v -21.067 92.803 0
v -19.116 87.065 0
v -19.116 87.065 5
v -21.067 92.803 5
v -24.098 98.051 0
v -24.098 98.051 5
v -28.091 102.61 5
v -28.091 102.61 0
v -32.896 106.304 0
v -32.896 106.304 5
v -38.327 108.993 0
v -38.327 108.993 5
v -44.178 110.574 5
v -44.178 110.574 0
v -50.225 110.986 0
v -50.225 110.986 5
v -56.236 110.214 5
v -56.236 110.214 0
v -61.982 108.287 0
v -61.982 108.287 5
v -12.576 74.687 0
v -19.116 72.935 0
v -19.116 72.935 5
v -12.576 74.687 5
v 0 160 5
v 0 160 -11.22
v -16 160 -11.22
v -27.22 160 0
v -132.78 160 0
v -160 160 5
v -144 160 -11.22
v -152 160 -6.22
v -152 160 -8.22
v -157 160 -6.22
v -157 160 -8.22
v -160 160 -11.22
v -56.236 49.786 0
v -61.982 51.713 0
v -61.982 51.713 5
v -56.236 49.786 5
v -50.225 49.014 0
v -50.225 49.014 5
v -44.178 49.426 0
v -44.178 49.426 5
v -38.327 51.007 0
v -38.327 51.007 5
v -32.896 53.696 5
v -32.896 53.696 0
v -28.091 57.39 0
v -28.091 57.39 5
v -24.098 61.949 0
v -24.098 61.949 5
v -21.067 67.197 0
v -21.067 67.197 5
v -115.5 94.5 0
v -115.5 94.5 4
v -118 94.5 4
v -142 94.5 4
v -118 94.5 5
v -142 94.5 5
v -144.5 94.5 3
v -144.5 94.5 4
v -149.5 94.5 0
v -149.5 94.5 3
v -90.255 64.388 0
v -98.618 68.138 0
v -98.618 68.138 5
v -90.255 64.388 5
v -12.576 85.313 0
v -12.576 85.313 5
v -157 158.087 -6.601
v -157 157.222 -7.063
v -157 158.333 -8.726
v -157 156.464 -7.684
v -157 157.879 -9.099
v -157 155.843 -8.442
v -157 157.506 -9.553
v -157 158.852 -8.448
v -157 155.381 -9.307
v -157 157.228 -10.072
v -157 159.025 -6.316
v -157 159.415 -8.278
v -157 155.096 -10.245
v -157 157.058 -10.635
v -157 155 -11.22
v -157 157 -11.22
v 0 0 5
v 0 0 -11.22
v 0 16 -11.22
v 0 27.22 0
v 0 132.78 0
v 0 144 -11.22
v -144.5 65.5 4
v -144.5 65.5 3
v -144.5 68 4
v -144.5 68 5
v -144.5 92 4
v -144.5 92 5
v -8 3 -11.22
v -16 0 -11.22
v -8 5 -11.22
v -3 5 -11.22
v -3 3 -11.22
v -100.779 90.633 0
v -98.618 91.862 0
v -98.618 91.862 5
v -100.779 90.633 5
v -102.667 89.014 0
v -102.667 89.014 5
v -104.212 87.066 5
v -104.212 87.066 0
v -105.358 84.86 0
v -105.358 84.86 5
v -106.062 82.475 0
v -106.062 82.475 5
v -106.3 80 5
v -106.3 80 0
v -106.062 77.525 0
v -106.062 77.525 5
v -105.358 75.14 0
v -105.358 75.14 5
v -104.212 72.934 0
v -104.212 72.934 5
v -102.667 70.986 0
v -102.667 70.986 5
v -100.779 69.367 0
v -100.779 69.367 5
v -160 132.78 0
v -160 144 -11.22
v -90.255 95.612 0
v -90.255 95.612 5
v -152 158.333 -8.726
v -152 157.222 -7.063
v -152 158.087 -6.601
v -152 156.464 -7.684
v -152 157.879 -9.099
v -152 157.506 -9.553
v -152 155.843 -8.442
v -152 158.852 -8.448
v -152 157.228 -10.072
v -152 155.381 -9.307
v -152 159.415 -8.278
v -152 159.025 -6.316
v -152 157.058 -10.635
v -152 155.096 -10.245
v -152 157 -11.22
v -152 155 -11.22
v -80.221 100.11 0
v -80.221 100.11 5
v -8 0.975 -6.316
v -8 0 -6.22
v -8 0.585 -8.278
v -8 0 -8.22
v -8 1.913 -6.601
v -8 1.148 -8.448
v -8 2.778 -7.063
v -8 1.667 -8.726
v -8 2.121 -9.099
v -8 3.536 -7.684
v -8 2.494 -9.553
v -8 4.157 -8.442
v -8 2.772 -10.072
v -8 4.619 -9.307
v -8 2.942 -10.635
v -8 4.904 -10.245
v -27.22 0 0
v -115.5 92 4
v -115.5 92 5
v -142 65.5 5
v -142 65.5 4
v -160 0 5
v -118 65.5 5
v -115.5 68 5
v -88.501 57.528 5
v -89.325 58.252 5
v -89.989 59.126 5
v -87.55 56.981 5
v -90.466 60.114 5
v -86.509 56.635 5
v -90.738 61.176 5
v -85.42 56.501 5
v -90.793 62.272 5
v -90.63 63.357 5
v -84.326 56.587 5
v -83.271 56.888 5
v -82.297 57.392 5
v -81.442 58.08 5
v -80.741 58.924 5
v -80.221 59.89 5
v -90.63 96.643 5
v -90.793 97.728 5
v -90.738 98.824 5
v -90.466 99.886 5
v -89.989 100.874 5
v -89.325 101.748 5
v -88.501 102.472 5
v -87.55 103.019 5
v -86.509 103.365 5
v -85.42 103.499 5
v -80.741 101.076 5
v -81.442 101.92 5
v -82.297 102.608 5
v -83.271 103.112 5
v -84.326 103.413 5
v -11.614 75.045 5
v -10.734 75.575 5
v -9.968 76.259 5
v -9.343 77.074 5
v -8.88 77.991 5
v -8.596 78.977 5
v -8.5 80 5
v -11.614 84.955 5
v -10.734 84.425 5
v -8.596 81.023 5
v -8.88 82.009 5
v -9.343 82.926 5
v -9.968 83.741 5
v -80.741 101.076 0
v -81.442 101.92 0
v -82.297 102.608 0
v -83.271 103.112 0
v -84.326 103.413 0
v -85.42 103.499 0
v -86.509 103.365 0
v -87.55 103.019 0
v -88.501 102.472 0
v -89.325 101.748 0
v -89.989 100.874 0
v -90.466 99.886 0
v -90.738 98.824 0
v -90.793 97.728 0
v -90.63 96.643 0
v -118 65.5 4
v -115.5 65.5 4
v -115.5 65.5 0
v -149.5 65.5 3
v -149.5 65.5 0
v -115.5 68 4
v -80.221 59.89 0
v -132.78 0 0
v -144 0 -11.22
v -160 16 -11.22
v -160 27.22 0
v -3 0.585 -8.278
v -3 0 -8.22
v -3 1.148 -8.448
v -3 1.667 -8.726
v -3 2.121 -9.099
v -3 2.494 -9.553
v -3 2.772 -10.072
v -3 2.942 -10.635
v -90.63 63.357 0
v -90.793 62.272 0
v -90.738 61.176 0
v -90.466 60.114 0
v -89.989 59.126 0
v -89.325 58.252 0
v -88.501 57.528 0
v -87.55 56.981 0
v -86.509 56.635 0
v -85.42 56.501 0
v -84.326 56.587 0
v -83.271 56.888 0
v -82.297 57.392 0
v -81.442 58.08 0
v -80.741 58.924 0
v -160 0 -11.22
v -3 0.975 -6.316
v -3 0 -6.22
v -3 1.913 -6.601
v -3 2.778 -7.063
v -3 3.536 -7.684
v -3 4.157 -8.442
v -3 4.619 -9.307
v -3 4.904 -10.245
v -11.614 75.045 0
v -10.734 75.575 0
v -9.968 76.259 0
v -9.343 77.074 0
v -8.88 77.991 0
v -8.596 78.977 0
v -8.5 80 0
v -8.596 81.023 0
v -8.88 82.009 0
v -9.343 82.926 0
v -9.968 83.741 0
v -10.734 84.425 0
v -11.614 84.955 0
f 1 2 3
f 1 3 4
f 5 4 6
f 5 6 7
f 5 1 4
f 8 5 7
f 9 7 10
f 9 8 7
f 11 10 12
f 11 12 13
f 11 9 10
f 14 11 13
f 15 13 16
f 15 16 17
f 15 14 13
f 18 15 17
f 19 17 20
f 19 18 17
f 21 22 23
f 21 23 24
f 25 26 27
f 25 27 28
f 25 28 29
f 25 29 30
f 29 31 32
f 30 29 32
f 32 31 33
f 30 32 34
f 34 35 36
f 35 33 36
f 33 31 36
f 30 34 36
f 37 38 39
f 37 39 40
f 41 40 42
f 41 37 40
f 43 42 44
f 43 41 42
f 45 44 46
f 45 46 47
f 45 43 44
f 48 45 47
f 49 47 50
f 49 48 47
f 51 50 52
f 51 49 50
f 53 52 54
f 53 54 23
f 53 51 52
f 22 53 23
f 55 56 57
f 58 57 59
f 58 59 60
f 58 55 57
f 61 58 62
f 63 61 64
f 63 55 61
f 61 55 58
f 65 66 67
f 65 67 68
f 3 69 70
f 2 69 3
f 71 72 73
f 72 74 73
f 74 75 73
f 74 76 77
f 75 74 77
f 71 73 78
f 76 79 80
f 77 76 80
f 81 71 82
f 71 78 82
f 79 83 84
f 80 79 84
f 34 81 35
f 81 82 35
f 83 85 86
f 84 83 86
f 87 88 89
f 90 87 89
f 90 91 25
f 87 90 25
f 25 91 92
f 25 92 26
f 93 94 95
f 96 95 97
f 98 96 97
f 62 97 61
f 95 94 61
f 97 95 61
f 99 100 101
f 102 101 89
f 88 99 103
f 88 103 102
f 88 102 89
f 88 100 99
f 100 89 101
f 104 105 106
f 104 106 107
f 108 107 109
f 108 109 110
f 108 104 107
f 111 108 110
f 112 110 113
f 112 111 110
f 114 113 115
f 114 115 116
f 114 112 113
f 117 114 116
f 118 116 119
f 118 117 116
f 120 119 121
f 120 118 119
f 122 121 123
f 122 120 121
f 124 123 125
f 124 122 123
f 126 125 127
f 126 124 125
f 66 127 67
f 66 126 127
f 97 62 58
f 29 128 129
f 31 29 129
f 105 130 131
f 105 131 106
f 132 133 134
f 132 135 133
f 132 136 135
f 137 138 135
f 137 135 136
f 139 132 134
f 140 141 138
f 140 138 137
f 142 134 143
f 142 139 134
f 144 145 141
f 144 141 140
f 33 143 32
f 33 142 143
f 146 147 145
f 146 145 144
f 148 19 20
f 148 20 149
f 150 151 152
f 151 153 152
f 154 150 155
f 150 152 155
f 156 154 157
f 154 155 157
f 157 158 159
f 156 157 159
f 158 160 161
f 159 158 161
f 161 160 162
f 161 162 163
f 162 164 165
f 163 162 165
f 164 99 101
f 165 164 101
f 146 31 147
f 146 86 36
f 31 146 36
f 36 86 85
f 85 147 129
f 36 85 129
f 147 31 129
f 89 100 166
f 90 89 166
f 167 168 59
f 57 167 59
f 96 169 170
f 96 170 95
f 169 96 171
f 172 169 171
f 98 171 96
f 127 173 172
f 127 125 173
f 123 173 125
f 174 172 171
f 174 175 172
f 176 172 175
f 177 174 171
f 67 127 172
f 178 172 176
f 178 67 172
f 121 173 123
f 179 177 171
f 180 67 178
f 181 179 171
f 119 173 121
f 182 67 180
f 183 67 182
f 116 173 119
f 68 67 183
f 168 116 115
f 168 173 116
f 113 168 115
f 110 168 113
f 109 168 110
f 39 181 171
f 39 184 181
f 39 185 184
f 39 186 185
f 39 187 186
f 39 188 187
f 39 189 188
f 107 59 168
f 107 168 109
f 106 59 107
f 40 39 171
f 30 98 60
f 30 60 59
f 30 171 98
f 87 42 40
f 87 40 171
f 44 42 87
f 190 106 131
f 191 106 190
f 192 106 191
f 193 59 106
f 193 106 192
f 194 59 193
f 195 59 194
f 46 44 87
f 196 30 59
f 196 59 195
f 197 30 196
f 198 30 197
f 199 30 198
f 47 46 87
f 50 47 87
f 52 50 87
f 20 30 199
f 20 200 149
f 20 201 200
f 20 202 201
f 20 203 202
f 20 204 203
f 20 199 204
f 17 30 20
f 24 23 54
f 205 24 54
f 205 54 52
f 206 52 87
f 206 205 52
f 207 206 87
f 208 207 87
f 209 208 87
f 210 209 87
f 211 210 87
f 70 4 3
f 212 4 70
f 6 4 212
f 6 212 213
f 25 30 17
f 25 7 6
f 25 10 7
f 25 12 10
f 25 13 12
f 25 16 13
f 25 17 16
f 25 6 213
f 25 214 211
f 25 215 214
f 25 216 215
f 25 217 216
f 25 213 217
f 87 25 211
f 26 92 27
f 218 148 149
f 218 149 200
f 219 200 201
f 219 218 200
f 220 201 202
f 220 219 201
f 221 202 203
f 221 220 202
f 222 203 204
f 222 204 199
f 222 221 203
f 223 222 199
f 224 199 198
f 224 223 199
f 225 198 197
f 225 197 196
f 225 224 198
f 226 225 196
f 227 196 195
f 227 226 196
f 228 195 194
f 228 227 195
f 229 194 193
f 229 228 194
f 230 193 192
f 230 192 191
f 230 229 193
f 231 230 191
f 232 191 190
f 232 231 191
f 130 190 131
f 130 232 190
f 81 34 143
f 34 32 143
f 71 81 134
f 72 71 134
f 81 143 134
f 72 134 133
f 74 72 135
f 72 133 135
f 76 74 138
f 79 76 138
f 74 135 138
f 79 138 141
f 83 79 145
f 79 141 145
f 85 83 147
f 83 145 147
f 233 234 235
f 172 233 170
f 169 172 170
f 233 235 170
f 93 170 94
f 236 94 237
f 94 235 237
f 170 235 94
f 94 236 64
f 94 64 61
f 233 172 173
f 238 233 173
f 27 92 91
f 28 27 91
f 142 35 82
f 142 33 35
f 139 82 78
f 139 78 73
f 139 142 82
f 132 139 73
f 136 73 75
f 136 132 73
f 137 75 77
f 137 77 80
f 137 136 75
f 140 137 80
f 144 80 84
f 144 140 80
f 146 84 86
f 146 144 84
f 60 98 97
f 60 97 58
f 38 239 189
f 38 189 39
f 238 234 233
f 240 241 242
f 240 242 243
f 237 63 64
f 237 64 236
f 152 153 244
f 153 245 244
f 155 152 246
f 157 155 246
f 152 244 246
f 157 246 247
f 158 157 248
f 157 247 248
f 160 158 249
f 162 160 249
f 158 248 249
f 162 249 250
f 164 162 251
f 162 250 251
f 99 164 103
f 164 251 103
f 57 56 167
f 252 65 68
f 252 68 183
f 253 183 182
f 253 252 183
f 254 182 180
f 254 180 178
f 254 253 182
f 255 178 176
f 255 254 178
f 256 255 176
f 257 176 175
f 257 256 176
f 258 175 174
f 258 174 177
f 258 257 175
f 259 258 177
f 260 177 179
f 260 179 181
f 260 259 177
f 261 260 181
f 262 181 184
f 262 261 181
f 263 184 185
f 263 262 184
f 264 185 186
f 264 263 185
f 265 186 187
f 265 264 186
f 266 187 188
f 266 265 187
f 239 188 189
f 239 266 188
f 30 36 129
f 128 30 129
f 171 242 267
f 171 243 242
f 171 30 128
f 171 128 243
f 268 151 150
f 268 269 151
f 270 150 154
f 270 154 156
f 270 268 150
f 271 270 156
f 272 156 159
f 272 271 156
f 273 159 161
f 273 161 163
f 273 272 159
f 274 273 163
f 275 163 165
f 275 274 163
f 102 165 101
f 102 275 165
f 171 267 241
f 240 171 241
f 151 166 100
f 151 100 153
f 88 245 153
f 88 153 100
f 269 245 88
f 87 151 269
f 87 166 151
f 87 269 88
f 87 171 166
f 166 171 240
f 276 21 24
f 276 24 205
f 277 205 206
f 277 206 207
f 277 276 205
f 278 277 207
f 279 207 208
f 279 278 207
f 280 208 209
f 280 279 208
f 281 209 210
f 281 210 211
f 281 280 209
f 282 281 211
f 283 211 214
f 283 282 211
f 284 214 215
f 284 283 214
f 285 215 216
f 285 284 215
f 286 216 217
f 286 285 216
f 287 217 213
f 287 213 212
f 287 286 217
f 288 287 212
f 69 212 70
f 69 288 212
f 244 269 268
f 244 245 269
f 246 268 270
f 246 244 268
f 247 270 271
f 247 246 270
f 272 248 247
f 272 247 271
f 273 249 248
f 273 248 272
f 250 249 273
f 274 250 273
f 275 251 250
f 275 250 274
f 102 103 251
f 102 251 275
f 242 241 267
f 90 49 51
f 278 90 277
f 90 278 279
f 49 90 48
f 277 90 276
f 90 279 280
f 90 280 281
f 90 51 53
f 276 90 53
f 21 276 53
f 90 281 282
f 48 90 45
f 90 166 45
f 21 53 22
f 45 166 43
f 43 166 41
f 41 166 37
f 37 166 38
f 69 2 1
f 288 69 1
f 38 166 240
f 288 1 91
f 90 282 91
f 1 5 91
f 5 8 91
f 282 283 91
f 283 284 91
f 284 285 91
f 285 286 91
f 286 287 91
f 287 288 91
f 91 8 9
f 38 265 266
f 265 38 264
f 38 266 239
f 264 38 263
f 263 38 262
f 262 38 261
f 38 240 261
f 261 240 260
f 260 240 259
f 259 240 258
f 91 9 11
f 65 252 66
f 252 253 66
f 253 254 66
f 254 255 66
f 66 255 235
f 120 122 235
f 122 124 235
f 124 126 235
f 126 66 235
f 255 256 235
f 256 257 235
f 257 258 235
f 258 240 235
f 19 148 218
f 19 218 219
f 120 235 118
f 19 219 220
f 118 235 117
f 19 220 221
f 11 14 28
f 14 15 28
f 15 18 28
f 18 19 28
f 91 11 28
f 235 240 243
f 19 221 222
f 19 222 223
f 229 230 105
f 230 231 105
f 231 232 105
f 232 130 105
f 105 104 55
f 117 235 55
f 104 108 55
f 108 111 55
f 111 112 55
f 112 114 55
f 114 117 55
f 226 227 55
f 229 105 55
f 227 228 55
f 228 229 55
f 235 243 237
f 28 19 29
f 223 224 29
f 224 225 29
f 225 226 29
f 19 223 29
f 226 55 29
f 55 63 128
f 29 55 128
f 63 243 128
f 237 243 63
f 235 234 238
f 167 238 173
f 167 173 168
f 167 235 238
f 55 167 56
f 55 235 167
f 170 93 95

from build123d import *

# Parameters (mm, degrees)
SKETCH1_W           = 160
SKETCH1_H           = 160
SKETCH1_W_2         = 29
SKETCH1_H_2         = 29
BOSS_EXTRUDE1_DEPTH = 5
BOSS_EXTRUDE2_DEPTH = 1
SKETCH5_W           = 5
SKETCH5_H           = 29
CUT_EXTRUDE2_DEPTH  = 3
BOSS_EXTRUDE3_DEPTH = 11.22
BOSS_EXTRUDE5_DEPTH = 6.47787
BOSS_EXTRUDE6_DEPTH = 6.47787
BOSS_EXTRUDE7_DEPTH = 6.47787
BOSS_EXTRUDE8_DEPTH = 6.47787
SKETCH16_W          = 180
SKETCH16_H          = 180
SKETCH16_W_2        = 160
SKETCH16_H_2        = 160
CUT_EXTRUDE3_DEPTH  = 47
SKETCH18_W          = 5
SKETCH18_H          = 2
SKETCH19_W          = 5
SKETCH19_H          = 2


with BuildPart() as part:
    # Sketch1 → Boss-Extrude1 (new body)
    with BuildSketch(Plane(origin=(0, 0, 0), x_dir=(0, 1, 0), z_dir=(0, 0, 1))):
        with Locations((80, 80)):
            Rectangle(SKETCH1_W, SKETCH1_H)
        with BuildLine():
            Line((68.137582786, 98.618181818), (64.387982104, 90.254547554))
            ThreePointArc((64.387982104, 90.254547554), (56.981285025, 87.55), (59.88970449, 80.220959455))
            Line((59.88970449, 80.220959455), (51.712697414, 61.981818182))
            ThreePointArc((51.712697414, 61.981818182), (52.218398749, 35.545632261), (72.935219616, 19.115751158))
            Line((72.935219616, 19.115751158), (74.687407955, 12.576495252))
            ThreePointArc((74.687407955, 12.576495252), (80, 8.5), (85.312592045, 12.576495252))
            Line((85.312592045, 12.576495252), (87.064780384, 19.115751158))
            ThreePointArc((87.064780384, 19.115751158), (107.781601251, 35.545632261), (108.287302586, 61.981818182))
            Line((108.287302586, 61.981818182), (100.11029551, 80.220959455))
            ThreePointArc((100.11029551, 80.220959455), (103.018714975, 87.55), (95.612017896, 90.254547554))
            Line((95.612017896, 90.254547554), (91.862417214, 98.618181818))
            ThreePointArc((91.862417214, 98.618181818), (80, 106.3), (68.137582786, 98.618181818))
        make_face(mode=Mode.SUBTRACT)
        with Locations((80, 130)):
            Rectangle(SKETCH1_W_2, SKETCH1_H_2, mode=Mode.SUBTRACT)
    extrude(amount=BOSS_EXTRUDE1_DEPTH)

    # Sketch3 → Boss-Extrude2 (add)
    with BuildSketch(Plane.XY.offset(5)):
        Polygon((-144.5, 92), (-142, 94.5), (-144.5, 94.5), align=None)
        Polygon((-144.5, 65.5), (-142, 65.5), (-144.5, 68), align=None)
        Polygon((-115.5, 65.5), (-118, 65.5), (-115.5, 68), align=None)
        Polygon((-115.5, 94.5), (-115.5, 92), (-118, 94.5), align=None)
    extrude(amount=-BOSS_EXTRUDE2_DEPTH)

    # Sketch5 → Cut-Extrude2 (cut)
    with BuildSketch(Plane(origin=(0, 0, 0), x_dir=(1, 0, 0), z_dir=(0, 0, -1))):
        with Locations((-147, -80)):
            Rectangle(SKETCH5_W, SKETCH5_H)
    extrude(amount=-CUT_EXTRUDE2_DEPTH, mode=Mode.SUBTRACT)

    # Sketch6 → Boss-Extrude3 (add)
    with BuildSketch(Plane(origin=(0, 0, 0), x_dir=(1, 0, 0), z_dir=(0, 0, -1))):
        Polygon((-160, -16), (-160, 0), (-144, 0), align=None)
        Polygon((-144, -160), (-160, -160), (-160, -144), align=None)
        Polygon((0, -160), (-16, -160), (0, -144), align=None)
        Polygon((0, 0), (-16, 0), (0, -16), align=None)
    extrude(amount=BOSS_EXTRUDE3_DEPTH)

    # Sketch12 → Boss-Extrude5 (add)
    with BuildSketch(Plane(origin=(44.26, 44.26, 44.26), x_dir=(0.8164965809277263, -0.40824829046386296, -0.4082482904638628), z_dir=(0.5773502691896256, 0.5773502691896261, 0.5773502691896258))):
        Polygon((-54.207208008, 93.889638406), (-87.544763407, 113.13708499), (-73.80312595, 121.070823075), (-54.207208008, 109.757114576), align=None)
    extrude(amount=BOSS_EXTRUDE5_DEPTH)

    # Sketch13 → Boss-Extrude6 (add)
    with BuildSketch(Plane(origin=(-97.593333333, 97.593333333, 97.593333333), x_dir=(0.4082482904638652, -0.4082482904638646, 0.8164965809277241), z_dir=(-0.577350269189624, 0.5773502691896251, 0.5773502691896285))):
        Polygon((-133.268571939, 11.313708499), (-119.526934482, 19.247446584), (-119.526934482, -19.247446584), (-133.268571939, -11.313708499), align=None)
    extrude(amount=BOSS_EXTRUDE6_DEPTH)

    # Sketch14 → Boss-Extrude7 (add)
    with BuildSketch(Plane(origin=(-44.26, -44.26, 44.26), x_dir=(0.40824829046386135, 0.40824829046386096, 0.8164965809277279), z_dir=(-0.5773502691896302, -0.5773502691896242, 0.5773502691896232))):
        Polygon((-54.207208008, 132.384531574), (-67.948845465, 124.450793489), (-67.948845465, 101.823376491), (-54.207208008, 93.889638406), align=None)
    extrude(amount=BOSS_EXTRUDE7_DEPTH)

    # Sketch15 → Boss-Extrude8 (add)
    with BuildSketch(Plane(origin=(-9.073333333, 9.073333333, -9.073333333), x_dir=(-0.8164965809277261, -0.40824829046386324, 0.40824829046386274), z_dir=(0.5773502691896257, -0.5773502691896257, 0.577350269189626))):
        Polygon((-11.112518466, -19.247446584), (22.225036933, 0), (8.483399476, 7.933738085), (-11.112518466, -3.379970414), align=None)
    extrude(amount=BOSS_EXTRUDE8_DEPTH)

    # Sketch16 → Cut-Extrude3 (cut)
    with BuildSketch(Plane.XY.offset(5)):
        with Locations((-80, 80)):
            Rectangle(SKETCH16_W, SKETCH16_H)
        with Locations((-80, 80)):
            Rectangle(SKETCH16_W_2, SKETCH16_H_2, mode=Mode.SUBTRACT)
    extrude(amount=-CUT_EXTRUDE3_DEPTH, mode=Mode.SUBTRACT)

    # Sketch18 → Cut-Revolve1 (revolve, cut)
    with BuildSketch(Plane(origin=(0, 0, -11.22), x_dir=(1, 0, 0), z_dir=(0, 0, -1))):
        with Locations((-5.5, -4)):
            Rectangle(SKETCH18_W, SKETCH18_H)
    revolve(axis=Axis((0, 0, -11.22), (-1, 0, 0)), mode=Mode.SUBTRACT)

    # Sketch19 → Cut-Revolve2 (revolve, cut)
    with BuildSketch(Plane(origin=(0, 0, -11.22), x_dir=(1, 0, 0), z_dir=(0, 0, -1))):
        with Locations((-154.5, -156)):
            Rectangle(SKETCH19_W, SKETCH19_H)
    revolve(axis=Axis((-160, 160, -11.22), (1, 0, 0)), mode=Mode.SUBTRACT)


solid = part.part
